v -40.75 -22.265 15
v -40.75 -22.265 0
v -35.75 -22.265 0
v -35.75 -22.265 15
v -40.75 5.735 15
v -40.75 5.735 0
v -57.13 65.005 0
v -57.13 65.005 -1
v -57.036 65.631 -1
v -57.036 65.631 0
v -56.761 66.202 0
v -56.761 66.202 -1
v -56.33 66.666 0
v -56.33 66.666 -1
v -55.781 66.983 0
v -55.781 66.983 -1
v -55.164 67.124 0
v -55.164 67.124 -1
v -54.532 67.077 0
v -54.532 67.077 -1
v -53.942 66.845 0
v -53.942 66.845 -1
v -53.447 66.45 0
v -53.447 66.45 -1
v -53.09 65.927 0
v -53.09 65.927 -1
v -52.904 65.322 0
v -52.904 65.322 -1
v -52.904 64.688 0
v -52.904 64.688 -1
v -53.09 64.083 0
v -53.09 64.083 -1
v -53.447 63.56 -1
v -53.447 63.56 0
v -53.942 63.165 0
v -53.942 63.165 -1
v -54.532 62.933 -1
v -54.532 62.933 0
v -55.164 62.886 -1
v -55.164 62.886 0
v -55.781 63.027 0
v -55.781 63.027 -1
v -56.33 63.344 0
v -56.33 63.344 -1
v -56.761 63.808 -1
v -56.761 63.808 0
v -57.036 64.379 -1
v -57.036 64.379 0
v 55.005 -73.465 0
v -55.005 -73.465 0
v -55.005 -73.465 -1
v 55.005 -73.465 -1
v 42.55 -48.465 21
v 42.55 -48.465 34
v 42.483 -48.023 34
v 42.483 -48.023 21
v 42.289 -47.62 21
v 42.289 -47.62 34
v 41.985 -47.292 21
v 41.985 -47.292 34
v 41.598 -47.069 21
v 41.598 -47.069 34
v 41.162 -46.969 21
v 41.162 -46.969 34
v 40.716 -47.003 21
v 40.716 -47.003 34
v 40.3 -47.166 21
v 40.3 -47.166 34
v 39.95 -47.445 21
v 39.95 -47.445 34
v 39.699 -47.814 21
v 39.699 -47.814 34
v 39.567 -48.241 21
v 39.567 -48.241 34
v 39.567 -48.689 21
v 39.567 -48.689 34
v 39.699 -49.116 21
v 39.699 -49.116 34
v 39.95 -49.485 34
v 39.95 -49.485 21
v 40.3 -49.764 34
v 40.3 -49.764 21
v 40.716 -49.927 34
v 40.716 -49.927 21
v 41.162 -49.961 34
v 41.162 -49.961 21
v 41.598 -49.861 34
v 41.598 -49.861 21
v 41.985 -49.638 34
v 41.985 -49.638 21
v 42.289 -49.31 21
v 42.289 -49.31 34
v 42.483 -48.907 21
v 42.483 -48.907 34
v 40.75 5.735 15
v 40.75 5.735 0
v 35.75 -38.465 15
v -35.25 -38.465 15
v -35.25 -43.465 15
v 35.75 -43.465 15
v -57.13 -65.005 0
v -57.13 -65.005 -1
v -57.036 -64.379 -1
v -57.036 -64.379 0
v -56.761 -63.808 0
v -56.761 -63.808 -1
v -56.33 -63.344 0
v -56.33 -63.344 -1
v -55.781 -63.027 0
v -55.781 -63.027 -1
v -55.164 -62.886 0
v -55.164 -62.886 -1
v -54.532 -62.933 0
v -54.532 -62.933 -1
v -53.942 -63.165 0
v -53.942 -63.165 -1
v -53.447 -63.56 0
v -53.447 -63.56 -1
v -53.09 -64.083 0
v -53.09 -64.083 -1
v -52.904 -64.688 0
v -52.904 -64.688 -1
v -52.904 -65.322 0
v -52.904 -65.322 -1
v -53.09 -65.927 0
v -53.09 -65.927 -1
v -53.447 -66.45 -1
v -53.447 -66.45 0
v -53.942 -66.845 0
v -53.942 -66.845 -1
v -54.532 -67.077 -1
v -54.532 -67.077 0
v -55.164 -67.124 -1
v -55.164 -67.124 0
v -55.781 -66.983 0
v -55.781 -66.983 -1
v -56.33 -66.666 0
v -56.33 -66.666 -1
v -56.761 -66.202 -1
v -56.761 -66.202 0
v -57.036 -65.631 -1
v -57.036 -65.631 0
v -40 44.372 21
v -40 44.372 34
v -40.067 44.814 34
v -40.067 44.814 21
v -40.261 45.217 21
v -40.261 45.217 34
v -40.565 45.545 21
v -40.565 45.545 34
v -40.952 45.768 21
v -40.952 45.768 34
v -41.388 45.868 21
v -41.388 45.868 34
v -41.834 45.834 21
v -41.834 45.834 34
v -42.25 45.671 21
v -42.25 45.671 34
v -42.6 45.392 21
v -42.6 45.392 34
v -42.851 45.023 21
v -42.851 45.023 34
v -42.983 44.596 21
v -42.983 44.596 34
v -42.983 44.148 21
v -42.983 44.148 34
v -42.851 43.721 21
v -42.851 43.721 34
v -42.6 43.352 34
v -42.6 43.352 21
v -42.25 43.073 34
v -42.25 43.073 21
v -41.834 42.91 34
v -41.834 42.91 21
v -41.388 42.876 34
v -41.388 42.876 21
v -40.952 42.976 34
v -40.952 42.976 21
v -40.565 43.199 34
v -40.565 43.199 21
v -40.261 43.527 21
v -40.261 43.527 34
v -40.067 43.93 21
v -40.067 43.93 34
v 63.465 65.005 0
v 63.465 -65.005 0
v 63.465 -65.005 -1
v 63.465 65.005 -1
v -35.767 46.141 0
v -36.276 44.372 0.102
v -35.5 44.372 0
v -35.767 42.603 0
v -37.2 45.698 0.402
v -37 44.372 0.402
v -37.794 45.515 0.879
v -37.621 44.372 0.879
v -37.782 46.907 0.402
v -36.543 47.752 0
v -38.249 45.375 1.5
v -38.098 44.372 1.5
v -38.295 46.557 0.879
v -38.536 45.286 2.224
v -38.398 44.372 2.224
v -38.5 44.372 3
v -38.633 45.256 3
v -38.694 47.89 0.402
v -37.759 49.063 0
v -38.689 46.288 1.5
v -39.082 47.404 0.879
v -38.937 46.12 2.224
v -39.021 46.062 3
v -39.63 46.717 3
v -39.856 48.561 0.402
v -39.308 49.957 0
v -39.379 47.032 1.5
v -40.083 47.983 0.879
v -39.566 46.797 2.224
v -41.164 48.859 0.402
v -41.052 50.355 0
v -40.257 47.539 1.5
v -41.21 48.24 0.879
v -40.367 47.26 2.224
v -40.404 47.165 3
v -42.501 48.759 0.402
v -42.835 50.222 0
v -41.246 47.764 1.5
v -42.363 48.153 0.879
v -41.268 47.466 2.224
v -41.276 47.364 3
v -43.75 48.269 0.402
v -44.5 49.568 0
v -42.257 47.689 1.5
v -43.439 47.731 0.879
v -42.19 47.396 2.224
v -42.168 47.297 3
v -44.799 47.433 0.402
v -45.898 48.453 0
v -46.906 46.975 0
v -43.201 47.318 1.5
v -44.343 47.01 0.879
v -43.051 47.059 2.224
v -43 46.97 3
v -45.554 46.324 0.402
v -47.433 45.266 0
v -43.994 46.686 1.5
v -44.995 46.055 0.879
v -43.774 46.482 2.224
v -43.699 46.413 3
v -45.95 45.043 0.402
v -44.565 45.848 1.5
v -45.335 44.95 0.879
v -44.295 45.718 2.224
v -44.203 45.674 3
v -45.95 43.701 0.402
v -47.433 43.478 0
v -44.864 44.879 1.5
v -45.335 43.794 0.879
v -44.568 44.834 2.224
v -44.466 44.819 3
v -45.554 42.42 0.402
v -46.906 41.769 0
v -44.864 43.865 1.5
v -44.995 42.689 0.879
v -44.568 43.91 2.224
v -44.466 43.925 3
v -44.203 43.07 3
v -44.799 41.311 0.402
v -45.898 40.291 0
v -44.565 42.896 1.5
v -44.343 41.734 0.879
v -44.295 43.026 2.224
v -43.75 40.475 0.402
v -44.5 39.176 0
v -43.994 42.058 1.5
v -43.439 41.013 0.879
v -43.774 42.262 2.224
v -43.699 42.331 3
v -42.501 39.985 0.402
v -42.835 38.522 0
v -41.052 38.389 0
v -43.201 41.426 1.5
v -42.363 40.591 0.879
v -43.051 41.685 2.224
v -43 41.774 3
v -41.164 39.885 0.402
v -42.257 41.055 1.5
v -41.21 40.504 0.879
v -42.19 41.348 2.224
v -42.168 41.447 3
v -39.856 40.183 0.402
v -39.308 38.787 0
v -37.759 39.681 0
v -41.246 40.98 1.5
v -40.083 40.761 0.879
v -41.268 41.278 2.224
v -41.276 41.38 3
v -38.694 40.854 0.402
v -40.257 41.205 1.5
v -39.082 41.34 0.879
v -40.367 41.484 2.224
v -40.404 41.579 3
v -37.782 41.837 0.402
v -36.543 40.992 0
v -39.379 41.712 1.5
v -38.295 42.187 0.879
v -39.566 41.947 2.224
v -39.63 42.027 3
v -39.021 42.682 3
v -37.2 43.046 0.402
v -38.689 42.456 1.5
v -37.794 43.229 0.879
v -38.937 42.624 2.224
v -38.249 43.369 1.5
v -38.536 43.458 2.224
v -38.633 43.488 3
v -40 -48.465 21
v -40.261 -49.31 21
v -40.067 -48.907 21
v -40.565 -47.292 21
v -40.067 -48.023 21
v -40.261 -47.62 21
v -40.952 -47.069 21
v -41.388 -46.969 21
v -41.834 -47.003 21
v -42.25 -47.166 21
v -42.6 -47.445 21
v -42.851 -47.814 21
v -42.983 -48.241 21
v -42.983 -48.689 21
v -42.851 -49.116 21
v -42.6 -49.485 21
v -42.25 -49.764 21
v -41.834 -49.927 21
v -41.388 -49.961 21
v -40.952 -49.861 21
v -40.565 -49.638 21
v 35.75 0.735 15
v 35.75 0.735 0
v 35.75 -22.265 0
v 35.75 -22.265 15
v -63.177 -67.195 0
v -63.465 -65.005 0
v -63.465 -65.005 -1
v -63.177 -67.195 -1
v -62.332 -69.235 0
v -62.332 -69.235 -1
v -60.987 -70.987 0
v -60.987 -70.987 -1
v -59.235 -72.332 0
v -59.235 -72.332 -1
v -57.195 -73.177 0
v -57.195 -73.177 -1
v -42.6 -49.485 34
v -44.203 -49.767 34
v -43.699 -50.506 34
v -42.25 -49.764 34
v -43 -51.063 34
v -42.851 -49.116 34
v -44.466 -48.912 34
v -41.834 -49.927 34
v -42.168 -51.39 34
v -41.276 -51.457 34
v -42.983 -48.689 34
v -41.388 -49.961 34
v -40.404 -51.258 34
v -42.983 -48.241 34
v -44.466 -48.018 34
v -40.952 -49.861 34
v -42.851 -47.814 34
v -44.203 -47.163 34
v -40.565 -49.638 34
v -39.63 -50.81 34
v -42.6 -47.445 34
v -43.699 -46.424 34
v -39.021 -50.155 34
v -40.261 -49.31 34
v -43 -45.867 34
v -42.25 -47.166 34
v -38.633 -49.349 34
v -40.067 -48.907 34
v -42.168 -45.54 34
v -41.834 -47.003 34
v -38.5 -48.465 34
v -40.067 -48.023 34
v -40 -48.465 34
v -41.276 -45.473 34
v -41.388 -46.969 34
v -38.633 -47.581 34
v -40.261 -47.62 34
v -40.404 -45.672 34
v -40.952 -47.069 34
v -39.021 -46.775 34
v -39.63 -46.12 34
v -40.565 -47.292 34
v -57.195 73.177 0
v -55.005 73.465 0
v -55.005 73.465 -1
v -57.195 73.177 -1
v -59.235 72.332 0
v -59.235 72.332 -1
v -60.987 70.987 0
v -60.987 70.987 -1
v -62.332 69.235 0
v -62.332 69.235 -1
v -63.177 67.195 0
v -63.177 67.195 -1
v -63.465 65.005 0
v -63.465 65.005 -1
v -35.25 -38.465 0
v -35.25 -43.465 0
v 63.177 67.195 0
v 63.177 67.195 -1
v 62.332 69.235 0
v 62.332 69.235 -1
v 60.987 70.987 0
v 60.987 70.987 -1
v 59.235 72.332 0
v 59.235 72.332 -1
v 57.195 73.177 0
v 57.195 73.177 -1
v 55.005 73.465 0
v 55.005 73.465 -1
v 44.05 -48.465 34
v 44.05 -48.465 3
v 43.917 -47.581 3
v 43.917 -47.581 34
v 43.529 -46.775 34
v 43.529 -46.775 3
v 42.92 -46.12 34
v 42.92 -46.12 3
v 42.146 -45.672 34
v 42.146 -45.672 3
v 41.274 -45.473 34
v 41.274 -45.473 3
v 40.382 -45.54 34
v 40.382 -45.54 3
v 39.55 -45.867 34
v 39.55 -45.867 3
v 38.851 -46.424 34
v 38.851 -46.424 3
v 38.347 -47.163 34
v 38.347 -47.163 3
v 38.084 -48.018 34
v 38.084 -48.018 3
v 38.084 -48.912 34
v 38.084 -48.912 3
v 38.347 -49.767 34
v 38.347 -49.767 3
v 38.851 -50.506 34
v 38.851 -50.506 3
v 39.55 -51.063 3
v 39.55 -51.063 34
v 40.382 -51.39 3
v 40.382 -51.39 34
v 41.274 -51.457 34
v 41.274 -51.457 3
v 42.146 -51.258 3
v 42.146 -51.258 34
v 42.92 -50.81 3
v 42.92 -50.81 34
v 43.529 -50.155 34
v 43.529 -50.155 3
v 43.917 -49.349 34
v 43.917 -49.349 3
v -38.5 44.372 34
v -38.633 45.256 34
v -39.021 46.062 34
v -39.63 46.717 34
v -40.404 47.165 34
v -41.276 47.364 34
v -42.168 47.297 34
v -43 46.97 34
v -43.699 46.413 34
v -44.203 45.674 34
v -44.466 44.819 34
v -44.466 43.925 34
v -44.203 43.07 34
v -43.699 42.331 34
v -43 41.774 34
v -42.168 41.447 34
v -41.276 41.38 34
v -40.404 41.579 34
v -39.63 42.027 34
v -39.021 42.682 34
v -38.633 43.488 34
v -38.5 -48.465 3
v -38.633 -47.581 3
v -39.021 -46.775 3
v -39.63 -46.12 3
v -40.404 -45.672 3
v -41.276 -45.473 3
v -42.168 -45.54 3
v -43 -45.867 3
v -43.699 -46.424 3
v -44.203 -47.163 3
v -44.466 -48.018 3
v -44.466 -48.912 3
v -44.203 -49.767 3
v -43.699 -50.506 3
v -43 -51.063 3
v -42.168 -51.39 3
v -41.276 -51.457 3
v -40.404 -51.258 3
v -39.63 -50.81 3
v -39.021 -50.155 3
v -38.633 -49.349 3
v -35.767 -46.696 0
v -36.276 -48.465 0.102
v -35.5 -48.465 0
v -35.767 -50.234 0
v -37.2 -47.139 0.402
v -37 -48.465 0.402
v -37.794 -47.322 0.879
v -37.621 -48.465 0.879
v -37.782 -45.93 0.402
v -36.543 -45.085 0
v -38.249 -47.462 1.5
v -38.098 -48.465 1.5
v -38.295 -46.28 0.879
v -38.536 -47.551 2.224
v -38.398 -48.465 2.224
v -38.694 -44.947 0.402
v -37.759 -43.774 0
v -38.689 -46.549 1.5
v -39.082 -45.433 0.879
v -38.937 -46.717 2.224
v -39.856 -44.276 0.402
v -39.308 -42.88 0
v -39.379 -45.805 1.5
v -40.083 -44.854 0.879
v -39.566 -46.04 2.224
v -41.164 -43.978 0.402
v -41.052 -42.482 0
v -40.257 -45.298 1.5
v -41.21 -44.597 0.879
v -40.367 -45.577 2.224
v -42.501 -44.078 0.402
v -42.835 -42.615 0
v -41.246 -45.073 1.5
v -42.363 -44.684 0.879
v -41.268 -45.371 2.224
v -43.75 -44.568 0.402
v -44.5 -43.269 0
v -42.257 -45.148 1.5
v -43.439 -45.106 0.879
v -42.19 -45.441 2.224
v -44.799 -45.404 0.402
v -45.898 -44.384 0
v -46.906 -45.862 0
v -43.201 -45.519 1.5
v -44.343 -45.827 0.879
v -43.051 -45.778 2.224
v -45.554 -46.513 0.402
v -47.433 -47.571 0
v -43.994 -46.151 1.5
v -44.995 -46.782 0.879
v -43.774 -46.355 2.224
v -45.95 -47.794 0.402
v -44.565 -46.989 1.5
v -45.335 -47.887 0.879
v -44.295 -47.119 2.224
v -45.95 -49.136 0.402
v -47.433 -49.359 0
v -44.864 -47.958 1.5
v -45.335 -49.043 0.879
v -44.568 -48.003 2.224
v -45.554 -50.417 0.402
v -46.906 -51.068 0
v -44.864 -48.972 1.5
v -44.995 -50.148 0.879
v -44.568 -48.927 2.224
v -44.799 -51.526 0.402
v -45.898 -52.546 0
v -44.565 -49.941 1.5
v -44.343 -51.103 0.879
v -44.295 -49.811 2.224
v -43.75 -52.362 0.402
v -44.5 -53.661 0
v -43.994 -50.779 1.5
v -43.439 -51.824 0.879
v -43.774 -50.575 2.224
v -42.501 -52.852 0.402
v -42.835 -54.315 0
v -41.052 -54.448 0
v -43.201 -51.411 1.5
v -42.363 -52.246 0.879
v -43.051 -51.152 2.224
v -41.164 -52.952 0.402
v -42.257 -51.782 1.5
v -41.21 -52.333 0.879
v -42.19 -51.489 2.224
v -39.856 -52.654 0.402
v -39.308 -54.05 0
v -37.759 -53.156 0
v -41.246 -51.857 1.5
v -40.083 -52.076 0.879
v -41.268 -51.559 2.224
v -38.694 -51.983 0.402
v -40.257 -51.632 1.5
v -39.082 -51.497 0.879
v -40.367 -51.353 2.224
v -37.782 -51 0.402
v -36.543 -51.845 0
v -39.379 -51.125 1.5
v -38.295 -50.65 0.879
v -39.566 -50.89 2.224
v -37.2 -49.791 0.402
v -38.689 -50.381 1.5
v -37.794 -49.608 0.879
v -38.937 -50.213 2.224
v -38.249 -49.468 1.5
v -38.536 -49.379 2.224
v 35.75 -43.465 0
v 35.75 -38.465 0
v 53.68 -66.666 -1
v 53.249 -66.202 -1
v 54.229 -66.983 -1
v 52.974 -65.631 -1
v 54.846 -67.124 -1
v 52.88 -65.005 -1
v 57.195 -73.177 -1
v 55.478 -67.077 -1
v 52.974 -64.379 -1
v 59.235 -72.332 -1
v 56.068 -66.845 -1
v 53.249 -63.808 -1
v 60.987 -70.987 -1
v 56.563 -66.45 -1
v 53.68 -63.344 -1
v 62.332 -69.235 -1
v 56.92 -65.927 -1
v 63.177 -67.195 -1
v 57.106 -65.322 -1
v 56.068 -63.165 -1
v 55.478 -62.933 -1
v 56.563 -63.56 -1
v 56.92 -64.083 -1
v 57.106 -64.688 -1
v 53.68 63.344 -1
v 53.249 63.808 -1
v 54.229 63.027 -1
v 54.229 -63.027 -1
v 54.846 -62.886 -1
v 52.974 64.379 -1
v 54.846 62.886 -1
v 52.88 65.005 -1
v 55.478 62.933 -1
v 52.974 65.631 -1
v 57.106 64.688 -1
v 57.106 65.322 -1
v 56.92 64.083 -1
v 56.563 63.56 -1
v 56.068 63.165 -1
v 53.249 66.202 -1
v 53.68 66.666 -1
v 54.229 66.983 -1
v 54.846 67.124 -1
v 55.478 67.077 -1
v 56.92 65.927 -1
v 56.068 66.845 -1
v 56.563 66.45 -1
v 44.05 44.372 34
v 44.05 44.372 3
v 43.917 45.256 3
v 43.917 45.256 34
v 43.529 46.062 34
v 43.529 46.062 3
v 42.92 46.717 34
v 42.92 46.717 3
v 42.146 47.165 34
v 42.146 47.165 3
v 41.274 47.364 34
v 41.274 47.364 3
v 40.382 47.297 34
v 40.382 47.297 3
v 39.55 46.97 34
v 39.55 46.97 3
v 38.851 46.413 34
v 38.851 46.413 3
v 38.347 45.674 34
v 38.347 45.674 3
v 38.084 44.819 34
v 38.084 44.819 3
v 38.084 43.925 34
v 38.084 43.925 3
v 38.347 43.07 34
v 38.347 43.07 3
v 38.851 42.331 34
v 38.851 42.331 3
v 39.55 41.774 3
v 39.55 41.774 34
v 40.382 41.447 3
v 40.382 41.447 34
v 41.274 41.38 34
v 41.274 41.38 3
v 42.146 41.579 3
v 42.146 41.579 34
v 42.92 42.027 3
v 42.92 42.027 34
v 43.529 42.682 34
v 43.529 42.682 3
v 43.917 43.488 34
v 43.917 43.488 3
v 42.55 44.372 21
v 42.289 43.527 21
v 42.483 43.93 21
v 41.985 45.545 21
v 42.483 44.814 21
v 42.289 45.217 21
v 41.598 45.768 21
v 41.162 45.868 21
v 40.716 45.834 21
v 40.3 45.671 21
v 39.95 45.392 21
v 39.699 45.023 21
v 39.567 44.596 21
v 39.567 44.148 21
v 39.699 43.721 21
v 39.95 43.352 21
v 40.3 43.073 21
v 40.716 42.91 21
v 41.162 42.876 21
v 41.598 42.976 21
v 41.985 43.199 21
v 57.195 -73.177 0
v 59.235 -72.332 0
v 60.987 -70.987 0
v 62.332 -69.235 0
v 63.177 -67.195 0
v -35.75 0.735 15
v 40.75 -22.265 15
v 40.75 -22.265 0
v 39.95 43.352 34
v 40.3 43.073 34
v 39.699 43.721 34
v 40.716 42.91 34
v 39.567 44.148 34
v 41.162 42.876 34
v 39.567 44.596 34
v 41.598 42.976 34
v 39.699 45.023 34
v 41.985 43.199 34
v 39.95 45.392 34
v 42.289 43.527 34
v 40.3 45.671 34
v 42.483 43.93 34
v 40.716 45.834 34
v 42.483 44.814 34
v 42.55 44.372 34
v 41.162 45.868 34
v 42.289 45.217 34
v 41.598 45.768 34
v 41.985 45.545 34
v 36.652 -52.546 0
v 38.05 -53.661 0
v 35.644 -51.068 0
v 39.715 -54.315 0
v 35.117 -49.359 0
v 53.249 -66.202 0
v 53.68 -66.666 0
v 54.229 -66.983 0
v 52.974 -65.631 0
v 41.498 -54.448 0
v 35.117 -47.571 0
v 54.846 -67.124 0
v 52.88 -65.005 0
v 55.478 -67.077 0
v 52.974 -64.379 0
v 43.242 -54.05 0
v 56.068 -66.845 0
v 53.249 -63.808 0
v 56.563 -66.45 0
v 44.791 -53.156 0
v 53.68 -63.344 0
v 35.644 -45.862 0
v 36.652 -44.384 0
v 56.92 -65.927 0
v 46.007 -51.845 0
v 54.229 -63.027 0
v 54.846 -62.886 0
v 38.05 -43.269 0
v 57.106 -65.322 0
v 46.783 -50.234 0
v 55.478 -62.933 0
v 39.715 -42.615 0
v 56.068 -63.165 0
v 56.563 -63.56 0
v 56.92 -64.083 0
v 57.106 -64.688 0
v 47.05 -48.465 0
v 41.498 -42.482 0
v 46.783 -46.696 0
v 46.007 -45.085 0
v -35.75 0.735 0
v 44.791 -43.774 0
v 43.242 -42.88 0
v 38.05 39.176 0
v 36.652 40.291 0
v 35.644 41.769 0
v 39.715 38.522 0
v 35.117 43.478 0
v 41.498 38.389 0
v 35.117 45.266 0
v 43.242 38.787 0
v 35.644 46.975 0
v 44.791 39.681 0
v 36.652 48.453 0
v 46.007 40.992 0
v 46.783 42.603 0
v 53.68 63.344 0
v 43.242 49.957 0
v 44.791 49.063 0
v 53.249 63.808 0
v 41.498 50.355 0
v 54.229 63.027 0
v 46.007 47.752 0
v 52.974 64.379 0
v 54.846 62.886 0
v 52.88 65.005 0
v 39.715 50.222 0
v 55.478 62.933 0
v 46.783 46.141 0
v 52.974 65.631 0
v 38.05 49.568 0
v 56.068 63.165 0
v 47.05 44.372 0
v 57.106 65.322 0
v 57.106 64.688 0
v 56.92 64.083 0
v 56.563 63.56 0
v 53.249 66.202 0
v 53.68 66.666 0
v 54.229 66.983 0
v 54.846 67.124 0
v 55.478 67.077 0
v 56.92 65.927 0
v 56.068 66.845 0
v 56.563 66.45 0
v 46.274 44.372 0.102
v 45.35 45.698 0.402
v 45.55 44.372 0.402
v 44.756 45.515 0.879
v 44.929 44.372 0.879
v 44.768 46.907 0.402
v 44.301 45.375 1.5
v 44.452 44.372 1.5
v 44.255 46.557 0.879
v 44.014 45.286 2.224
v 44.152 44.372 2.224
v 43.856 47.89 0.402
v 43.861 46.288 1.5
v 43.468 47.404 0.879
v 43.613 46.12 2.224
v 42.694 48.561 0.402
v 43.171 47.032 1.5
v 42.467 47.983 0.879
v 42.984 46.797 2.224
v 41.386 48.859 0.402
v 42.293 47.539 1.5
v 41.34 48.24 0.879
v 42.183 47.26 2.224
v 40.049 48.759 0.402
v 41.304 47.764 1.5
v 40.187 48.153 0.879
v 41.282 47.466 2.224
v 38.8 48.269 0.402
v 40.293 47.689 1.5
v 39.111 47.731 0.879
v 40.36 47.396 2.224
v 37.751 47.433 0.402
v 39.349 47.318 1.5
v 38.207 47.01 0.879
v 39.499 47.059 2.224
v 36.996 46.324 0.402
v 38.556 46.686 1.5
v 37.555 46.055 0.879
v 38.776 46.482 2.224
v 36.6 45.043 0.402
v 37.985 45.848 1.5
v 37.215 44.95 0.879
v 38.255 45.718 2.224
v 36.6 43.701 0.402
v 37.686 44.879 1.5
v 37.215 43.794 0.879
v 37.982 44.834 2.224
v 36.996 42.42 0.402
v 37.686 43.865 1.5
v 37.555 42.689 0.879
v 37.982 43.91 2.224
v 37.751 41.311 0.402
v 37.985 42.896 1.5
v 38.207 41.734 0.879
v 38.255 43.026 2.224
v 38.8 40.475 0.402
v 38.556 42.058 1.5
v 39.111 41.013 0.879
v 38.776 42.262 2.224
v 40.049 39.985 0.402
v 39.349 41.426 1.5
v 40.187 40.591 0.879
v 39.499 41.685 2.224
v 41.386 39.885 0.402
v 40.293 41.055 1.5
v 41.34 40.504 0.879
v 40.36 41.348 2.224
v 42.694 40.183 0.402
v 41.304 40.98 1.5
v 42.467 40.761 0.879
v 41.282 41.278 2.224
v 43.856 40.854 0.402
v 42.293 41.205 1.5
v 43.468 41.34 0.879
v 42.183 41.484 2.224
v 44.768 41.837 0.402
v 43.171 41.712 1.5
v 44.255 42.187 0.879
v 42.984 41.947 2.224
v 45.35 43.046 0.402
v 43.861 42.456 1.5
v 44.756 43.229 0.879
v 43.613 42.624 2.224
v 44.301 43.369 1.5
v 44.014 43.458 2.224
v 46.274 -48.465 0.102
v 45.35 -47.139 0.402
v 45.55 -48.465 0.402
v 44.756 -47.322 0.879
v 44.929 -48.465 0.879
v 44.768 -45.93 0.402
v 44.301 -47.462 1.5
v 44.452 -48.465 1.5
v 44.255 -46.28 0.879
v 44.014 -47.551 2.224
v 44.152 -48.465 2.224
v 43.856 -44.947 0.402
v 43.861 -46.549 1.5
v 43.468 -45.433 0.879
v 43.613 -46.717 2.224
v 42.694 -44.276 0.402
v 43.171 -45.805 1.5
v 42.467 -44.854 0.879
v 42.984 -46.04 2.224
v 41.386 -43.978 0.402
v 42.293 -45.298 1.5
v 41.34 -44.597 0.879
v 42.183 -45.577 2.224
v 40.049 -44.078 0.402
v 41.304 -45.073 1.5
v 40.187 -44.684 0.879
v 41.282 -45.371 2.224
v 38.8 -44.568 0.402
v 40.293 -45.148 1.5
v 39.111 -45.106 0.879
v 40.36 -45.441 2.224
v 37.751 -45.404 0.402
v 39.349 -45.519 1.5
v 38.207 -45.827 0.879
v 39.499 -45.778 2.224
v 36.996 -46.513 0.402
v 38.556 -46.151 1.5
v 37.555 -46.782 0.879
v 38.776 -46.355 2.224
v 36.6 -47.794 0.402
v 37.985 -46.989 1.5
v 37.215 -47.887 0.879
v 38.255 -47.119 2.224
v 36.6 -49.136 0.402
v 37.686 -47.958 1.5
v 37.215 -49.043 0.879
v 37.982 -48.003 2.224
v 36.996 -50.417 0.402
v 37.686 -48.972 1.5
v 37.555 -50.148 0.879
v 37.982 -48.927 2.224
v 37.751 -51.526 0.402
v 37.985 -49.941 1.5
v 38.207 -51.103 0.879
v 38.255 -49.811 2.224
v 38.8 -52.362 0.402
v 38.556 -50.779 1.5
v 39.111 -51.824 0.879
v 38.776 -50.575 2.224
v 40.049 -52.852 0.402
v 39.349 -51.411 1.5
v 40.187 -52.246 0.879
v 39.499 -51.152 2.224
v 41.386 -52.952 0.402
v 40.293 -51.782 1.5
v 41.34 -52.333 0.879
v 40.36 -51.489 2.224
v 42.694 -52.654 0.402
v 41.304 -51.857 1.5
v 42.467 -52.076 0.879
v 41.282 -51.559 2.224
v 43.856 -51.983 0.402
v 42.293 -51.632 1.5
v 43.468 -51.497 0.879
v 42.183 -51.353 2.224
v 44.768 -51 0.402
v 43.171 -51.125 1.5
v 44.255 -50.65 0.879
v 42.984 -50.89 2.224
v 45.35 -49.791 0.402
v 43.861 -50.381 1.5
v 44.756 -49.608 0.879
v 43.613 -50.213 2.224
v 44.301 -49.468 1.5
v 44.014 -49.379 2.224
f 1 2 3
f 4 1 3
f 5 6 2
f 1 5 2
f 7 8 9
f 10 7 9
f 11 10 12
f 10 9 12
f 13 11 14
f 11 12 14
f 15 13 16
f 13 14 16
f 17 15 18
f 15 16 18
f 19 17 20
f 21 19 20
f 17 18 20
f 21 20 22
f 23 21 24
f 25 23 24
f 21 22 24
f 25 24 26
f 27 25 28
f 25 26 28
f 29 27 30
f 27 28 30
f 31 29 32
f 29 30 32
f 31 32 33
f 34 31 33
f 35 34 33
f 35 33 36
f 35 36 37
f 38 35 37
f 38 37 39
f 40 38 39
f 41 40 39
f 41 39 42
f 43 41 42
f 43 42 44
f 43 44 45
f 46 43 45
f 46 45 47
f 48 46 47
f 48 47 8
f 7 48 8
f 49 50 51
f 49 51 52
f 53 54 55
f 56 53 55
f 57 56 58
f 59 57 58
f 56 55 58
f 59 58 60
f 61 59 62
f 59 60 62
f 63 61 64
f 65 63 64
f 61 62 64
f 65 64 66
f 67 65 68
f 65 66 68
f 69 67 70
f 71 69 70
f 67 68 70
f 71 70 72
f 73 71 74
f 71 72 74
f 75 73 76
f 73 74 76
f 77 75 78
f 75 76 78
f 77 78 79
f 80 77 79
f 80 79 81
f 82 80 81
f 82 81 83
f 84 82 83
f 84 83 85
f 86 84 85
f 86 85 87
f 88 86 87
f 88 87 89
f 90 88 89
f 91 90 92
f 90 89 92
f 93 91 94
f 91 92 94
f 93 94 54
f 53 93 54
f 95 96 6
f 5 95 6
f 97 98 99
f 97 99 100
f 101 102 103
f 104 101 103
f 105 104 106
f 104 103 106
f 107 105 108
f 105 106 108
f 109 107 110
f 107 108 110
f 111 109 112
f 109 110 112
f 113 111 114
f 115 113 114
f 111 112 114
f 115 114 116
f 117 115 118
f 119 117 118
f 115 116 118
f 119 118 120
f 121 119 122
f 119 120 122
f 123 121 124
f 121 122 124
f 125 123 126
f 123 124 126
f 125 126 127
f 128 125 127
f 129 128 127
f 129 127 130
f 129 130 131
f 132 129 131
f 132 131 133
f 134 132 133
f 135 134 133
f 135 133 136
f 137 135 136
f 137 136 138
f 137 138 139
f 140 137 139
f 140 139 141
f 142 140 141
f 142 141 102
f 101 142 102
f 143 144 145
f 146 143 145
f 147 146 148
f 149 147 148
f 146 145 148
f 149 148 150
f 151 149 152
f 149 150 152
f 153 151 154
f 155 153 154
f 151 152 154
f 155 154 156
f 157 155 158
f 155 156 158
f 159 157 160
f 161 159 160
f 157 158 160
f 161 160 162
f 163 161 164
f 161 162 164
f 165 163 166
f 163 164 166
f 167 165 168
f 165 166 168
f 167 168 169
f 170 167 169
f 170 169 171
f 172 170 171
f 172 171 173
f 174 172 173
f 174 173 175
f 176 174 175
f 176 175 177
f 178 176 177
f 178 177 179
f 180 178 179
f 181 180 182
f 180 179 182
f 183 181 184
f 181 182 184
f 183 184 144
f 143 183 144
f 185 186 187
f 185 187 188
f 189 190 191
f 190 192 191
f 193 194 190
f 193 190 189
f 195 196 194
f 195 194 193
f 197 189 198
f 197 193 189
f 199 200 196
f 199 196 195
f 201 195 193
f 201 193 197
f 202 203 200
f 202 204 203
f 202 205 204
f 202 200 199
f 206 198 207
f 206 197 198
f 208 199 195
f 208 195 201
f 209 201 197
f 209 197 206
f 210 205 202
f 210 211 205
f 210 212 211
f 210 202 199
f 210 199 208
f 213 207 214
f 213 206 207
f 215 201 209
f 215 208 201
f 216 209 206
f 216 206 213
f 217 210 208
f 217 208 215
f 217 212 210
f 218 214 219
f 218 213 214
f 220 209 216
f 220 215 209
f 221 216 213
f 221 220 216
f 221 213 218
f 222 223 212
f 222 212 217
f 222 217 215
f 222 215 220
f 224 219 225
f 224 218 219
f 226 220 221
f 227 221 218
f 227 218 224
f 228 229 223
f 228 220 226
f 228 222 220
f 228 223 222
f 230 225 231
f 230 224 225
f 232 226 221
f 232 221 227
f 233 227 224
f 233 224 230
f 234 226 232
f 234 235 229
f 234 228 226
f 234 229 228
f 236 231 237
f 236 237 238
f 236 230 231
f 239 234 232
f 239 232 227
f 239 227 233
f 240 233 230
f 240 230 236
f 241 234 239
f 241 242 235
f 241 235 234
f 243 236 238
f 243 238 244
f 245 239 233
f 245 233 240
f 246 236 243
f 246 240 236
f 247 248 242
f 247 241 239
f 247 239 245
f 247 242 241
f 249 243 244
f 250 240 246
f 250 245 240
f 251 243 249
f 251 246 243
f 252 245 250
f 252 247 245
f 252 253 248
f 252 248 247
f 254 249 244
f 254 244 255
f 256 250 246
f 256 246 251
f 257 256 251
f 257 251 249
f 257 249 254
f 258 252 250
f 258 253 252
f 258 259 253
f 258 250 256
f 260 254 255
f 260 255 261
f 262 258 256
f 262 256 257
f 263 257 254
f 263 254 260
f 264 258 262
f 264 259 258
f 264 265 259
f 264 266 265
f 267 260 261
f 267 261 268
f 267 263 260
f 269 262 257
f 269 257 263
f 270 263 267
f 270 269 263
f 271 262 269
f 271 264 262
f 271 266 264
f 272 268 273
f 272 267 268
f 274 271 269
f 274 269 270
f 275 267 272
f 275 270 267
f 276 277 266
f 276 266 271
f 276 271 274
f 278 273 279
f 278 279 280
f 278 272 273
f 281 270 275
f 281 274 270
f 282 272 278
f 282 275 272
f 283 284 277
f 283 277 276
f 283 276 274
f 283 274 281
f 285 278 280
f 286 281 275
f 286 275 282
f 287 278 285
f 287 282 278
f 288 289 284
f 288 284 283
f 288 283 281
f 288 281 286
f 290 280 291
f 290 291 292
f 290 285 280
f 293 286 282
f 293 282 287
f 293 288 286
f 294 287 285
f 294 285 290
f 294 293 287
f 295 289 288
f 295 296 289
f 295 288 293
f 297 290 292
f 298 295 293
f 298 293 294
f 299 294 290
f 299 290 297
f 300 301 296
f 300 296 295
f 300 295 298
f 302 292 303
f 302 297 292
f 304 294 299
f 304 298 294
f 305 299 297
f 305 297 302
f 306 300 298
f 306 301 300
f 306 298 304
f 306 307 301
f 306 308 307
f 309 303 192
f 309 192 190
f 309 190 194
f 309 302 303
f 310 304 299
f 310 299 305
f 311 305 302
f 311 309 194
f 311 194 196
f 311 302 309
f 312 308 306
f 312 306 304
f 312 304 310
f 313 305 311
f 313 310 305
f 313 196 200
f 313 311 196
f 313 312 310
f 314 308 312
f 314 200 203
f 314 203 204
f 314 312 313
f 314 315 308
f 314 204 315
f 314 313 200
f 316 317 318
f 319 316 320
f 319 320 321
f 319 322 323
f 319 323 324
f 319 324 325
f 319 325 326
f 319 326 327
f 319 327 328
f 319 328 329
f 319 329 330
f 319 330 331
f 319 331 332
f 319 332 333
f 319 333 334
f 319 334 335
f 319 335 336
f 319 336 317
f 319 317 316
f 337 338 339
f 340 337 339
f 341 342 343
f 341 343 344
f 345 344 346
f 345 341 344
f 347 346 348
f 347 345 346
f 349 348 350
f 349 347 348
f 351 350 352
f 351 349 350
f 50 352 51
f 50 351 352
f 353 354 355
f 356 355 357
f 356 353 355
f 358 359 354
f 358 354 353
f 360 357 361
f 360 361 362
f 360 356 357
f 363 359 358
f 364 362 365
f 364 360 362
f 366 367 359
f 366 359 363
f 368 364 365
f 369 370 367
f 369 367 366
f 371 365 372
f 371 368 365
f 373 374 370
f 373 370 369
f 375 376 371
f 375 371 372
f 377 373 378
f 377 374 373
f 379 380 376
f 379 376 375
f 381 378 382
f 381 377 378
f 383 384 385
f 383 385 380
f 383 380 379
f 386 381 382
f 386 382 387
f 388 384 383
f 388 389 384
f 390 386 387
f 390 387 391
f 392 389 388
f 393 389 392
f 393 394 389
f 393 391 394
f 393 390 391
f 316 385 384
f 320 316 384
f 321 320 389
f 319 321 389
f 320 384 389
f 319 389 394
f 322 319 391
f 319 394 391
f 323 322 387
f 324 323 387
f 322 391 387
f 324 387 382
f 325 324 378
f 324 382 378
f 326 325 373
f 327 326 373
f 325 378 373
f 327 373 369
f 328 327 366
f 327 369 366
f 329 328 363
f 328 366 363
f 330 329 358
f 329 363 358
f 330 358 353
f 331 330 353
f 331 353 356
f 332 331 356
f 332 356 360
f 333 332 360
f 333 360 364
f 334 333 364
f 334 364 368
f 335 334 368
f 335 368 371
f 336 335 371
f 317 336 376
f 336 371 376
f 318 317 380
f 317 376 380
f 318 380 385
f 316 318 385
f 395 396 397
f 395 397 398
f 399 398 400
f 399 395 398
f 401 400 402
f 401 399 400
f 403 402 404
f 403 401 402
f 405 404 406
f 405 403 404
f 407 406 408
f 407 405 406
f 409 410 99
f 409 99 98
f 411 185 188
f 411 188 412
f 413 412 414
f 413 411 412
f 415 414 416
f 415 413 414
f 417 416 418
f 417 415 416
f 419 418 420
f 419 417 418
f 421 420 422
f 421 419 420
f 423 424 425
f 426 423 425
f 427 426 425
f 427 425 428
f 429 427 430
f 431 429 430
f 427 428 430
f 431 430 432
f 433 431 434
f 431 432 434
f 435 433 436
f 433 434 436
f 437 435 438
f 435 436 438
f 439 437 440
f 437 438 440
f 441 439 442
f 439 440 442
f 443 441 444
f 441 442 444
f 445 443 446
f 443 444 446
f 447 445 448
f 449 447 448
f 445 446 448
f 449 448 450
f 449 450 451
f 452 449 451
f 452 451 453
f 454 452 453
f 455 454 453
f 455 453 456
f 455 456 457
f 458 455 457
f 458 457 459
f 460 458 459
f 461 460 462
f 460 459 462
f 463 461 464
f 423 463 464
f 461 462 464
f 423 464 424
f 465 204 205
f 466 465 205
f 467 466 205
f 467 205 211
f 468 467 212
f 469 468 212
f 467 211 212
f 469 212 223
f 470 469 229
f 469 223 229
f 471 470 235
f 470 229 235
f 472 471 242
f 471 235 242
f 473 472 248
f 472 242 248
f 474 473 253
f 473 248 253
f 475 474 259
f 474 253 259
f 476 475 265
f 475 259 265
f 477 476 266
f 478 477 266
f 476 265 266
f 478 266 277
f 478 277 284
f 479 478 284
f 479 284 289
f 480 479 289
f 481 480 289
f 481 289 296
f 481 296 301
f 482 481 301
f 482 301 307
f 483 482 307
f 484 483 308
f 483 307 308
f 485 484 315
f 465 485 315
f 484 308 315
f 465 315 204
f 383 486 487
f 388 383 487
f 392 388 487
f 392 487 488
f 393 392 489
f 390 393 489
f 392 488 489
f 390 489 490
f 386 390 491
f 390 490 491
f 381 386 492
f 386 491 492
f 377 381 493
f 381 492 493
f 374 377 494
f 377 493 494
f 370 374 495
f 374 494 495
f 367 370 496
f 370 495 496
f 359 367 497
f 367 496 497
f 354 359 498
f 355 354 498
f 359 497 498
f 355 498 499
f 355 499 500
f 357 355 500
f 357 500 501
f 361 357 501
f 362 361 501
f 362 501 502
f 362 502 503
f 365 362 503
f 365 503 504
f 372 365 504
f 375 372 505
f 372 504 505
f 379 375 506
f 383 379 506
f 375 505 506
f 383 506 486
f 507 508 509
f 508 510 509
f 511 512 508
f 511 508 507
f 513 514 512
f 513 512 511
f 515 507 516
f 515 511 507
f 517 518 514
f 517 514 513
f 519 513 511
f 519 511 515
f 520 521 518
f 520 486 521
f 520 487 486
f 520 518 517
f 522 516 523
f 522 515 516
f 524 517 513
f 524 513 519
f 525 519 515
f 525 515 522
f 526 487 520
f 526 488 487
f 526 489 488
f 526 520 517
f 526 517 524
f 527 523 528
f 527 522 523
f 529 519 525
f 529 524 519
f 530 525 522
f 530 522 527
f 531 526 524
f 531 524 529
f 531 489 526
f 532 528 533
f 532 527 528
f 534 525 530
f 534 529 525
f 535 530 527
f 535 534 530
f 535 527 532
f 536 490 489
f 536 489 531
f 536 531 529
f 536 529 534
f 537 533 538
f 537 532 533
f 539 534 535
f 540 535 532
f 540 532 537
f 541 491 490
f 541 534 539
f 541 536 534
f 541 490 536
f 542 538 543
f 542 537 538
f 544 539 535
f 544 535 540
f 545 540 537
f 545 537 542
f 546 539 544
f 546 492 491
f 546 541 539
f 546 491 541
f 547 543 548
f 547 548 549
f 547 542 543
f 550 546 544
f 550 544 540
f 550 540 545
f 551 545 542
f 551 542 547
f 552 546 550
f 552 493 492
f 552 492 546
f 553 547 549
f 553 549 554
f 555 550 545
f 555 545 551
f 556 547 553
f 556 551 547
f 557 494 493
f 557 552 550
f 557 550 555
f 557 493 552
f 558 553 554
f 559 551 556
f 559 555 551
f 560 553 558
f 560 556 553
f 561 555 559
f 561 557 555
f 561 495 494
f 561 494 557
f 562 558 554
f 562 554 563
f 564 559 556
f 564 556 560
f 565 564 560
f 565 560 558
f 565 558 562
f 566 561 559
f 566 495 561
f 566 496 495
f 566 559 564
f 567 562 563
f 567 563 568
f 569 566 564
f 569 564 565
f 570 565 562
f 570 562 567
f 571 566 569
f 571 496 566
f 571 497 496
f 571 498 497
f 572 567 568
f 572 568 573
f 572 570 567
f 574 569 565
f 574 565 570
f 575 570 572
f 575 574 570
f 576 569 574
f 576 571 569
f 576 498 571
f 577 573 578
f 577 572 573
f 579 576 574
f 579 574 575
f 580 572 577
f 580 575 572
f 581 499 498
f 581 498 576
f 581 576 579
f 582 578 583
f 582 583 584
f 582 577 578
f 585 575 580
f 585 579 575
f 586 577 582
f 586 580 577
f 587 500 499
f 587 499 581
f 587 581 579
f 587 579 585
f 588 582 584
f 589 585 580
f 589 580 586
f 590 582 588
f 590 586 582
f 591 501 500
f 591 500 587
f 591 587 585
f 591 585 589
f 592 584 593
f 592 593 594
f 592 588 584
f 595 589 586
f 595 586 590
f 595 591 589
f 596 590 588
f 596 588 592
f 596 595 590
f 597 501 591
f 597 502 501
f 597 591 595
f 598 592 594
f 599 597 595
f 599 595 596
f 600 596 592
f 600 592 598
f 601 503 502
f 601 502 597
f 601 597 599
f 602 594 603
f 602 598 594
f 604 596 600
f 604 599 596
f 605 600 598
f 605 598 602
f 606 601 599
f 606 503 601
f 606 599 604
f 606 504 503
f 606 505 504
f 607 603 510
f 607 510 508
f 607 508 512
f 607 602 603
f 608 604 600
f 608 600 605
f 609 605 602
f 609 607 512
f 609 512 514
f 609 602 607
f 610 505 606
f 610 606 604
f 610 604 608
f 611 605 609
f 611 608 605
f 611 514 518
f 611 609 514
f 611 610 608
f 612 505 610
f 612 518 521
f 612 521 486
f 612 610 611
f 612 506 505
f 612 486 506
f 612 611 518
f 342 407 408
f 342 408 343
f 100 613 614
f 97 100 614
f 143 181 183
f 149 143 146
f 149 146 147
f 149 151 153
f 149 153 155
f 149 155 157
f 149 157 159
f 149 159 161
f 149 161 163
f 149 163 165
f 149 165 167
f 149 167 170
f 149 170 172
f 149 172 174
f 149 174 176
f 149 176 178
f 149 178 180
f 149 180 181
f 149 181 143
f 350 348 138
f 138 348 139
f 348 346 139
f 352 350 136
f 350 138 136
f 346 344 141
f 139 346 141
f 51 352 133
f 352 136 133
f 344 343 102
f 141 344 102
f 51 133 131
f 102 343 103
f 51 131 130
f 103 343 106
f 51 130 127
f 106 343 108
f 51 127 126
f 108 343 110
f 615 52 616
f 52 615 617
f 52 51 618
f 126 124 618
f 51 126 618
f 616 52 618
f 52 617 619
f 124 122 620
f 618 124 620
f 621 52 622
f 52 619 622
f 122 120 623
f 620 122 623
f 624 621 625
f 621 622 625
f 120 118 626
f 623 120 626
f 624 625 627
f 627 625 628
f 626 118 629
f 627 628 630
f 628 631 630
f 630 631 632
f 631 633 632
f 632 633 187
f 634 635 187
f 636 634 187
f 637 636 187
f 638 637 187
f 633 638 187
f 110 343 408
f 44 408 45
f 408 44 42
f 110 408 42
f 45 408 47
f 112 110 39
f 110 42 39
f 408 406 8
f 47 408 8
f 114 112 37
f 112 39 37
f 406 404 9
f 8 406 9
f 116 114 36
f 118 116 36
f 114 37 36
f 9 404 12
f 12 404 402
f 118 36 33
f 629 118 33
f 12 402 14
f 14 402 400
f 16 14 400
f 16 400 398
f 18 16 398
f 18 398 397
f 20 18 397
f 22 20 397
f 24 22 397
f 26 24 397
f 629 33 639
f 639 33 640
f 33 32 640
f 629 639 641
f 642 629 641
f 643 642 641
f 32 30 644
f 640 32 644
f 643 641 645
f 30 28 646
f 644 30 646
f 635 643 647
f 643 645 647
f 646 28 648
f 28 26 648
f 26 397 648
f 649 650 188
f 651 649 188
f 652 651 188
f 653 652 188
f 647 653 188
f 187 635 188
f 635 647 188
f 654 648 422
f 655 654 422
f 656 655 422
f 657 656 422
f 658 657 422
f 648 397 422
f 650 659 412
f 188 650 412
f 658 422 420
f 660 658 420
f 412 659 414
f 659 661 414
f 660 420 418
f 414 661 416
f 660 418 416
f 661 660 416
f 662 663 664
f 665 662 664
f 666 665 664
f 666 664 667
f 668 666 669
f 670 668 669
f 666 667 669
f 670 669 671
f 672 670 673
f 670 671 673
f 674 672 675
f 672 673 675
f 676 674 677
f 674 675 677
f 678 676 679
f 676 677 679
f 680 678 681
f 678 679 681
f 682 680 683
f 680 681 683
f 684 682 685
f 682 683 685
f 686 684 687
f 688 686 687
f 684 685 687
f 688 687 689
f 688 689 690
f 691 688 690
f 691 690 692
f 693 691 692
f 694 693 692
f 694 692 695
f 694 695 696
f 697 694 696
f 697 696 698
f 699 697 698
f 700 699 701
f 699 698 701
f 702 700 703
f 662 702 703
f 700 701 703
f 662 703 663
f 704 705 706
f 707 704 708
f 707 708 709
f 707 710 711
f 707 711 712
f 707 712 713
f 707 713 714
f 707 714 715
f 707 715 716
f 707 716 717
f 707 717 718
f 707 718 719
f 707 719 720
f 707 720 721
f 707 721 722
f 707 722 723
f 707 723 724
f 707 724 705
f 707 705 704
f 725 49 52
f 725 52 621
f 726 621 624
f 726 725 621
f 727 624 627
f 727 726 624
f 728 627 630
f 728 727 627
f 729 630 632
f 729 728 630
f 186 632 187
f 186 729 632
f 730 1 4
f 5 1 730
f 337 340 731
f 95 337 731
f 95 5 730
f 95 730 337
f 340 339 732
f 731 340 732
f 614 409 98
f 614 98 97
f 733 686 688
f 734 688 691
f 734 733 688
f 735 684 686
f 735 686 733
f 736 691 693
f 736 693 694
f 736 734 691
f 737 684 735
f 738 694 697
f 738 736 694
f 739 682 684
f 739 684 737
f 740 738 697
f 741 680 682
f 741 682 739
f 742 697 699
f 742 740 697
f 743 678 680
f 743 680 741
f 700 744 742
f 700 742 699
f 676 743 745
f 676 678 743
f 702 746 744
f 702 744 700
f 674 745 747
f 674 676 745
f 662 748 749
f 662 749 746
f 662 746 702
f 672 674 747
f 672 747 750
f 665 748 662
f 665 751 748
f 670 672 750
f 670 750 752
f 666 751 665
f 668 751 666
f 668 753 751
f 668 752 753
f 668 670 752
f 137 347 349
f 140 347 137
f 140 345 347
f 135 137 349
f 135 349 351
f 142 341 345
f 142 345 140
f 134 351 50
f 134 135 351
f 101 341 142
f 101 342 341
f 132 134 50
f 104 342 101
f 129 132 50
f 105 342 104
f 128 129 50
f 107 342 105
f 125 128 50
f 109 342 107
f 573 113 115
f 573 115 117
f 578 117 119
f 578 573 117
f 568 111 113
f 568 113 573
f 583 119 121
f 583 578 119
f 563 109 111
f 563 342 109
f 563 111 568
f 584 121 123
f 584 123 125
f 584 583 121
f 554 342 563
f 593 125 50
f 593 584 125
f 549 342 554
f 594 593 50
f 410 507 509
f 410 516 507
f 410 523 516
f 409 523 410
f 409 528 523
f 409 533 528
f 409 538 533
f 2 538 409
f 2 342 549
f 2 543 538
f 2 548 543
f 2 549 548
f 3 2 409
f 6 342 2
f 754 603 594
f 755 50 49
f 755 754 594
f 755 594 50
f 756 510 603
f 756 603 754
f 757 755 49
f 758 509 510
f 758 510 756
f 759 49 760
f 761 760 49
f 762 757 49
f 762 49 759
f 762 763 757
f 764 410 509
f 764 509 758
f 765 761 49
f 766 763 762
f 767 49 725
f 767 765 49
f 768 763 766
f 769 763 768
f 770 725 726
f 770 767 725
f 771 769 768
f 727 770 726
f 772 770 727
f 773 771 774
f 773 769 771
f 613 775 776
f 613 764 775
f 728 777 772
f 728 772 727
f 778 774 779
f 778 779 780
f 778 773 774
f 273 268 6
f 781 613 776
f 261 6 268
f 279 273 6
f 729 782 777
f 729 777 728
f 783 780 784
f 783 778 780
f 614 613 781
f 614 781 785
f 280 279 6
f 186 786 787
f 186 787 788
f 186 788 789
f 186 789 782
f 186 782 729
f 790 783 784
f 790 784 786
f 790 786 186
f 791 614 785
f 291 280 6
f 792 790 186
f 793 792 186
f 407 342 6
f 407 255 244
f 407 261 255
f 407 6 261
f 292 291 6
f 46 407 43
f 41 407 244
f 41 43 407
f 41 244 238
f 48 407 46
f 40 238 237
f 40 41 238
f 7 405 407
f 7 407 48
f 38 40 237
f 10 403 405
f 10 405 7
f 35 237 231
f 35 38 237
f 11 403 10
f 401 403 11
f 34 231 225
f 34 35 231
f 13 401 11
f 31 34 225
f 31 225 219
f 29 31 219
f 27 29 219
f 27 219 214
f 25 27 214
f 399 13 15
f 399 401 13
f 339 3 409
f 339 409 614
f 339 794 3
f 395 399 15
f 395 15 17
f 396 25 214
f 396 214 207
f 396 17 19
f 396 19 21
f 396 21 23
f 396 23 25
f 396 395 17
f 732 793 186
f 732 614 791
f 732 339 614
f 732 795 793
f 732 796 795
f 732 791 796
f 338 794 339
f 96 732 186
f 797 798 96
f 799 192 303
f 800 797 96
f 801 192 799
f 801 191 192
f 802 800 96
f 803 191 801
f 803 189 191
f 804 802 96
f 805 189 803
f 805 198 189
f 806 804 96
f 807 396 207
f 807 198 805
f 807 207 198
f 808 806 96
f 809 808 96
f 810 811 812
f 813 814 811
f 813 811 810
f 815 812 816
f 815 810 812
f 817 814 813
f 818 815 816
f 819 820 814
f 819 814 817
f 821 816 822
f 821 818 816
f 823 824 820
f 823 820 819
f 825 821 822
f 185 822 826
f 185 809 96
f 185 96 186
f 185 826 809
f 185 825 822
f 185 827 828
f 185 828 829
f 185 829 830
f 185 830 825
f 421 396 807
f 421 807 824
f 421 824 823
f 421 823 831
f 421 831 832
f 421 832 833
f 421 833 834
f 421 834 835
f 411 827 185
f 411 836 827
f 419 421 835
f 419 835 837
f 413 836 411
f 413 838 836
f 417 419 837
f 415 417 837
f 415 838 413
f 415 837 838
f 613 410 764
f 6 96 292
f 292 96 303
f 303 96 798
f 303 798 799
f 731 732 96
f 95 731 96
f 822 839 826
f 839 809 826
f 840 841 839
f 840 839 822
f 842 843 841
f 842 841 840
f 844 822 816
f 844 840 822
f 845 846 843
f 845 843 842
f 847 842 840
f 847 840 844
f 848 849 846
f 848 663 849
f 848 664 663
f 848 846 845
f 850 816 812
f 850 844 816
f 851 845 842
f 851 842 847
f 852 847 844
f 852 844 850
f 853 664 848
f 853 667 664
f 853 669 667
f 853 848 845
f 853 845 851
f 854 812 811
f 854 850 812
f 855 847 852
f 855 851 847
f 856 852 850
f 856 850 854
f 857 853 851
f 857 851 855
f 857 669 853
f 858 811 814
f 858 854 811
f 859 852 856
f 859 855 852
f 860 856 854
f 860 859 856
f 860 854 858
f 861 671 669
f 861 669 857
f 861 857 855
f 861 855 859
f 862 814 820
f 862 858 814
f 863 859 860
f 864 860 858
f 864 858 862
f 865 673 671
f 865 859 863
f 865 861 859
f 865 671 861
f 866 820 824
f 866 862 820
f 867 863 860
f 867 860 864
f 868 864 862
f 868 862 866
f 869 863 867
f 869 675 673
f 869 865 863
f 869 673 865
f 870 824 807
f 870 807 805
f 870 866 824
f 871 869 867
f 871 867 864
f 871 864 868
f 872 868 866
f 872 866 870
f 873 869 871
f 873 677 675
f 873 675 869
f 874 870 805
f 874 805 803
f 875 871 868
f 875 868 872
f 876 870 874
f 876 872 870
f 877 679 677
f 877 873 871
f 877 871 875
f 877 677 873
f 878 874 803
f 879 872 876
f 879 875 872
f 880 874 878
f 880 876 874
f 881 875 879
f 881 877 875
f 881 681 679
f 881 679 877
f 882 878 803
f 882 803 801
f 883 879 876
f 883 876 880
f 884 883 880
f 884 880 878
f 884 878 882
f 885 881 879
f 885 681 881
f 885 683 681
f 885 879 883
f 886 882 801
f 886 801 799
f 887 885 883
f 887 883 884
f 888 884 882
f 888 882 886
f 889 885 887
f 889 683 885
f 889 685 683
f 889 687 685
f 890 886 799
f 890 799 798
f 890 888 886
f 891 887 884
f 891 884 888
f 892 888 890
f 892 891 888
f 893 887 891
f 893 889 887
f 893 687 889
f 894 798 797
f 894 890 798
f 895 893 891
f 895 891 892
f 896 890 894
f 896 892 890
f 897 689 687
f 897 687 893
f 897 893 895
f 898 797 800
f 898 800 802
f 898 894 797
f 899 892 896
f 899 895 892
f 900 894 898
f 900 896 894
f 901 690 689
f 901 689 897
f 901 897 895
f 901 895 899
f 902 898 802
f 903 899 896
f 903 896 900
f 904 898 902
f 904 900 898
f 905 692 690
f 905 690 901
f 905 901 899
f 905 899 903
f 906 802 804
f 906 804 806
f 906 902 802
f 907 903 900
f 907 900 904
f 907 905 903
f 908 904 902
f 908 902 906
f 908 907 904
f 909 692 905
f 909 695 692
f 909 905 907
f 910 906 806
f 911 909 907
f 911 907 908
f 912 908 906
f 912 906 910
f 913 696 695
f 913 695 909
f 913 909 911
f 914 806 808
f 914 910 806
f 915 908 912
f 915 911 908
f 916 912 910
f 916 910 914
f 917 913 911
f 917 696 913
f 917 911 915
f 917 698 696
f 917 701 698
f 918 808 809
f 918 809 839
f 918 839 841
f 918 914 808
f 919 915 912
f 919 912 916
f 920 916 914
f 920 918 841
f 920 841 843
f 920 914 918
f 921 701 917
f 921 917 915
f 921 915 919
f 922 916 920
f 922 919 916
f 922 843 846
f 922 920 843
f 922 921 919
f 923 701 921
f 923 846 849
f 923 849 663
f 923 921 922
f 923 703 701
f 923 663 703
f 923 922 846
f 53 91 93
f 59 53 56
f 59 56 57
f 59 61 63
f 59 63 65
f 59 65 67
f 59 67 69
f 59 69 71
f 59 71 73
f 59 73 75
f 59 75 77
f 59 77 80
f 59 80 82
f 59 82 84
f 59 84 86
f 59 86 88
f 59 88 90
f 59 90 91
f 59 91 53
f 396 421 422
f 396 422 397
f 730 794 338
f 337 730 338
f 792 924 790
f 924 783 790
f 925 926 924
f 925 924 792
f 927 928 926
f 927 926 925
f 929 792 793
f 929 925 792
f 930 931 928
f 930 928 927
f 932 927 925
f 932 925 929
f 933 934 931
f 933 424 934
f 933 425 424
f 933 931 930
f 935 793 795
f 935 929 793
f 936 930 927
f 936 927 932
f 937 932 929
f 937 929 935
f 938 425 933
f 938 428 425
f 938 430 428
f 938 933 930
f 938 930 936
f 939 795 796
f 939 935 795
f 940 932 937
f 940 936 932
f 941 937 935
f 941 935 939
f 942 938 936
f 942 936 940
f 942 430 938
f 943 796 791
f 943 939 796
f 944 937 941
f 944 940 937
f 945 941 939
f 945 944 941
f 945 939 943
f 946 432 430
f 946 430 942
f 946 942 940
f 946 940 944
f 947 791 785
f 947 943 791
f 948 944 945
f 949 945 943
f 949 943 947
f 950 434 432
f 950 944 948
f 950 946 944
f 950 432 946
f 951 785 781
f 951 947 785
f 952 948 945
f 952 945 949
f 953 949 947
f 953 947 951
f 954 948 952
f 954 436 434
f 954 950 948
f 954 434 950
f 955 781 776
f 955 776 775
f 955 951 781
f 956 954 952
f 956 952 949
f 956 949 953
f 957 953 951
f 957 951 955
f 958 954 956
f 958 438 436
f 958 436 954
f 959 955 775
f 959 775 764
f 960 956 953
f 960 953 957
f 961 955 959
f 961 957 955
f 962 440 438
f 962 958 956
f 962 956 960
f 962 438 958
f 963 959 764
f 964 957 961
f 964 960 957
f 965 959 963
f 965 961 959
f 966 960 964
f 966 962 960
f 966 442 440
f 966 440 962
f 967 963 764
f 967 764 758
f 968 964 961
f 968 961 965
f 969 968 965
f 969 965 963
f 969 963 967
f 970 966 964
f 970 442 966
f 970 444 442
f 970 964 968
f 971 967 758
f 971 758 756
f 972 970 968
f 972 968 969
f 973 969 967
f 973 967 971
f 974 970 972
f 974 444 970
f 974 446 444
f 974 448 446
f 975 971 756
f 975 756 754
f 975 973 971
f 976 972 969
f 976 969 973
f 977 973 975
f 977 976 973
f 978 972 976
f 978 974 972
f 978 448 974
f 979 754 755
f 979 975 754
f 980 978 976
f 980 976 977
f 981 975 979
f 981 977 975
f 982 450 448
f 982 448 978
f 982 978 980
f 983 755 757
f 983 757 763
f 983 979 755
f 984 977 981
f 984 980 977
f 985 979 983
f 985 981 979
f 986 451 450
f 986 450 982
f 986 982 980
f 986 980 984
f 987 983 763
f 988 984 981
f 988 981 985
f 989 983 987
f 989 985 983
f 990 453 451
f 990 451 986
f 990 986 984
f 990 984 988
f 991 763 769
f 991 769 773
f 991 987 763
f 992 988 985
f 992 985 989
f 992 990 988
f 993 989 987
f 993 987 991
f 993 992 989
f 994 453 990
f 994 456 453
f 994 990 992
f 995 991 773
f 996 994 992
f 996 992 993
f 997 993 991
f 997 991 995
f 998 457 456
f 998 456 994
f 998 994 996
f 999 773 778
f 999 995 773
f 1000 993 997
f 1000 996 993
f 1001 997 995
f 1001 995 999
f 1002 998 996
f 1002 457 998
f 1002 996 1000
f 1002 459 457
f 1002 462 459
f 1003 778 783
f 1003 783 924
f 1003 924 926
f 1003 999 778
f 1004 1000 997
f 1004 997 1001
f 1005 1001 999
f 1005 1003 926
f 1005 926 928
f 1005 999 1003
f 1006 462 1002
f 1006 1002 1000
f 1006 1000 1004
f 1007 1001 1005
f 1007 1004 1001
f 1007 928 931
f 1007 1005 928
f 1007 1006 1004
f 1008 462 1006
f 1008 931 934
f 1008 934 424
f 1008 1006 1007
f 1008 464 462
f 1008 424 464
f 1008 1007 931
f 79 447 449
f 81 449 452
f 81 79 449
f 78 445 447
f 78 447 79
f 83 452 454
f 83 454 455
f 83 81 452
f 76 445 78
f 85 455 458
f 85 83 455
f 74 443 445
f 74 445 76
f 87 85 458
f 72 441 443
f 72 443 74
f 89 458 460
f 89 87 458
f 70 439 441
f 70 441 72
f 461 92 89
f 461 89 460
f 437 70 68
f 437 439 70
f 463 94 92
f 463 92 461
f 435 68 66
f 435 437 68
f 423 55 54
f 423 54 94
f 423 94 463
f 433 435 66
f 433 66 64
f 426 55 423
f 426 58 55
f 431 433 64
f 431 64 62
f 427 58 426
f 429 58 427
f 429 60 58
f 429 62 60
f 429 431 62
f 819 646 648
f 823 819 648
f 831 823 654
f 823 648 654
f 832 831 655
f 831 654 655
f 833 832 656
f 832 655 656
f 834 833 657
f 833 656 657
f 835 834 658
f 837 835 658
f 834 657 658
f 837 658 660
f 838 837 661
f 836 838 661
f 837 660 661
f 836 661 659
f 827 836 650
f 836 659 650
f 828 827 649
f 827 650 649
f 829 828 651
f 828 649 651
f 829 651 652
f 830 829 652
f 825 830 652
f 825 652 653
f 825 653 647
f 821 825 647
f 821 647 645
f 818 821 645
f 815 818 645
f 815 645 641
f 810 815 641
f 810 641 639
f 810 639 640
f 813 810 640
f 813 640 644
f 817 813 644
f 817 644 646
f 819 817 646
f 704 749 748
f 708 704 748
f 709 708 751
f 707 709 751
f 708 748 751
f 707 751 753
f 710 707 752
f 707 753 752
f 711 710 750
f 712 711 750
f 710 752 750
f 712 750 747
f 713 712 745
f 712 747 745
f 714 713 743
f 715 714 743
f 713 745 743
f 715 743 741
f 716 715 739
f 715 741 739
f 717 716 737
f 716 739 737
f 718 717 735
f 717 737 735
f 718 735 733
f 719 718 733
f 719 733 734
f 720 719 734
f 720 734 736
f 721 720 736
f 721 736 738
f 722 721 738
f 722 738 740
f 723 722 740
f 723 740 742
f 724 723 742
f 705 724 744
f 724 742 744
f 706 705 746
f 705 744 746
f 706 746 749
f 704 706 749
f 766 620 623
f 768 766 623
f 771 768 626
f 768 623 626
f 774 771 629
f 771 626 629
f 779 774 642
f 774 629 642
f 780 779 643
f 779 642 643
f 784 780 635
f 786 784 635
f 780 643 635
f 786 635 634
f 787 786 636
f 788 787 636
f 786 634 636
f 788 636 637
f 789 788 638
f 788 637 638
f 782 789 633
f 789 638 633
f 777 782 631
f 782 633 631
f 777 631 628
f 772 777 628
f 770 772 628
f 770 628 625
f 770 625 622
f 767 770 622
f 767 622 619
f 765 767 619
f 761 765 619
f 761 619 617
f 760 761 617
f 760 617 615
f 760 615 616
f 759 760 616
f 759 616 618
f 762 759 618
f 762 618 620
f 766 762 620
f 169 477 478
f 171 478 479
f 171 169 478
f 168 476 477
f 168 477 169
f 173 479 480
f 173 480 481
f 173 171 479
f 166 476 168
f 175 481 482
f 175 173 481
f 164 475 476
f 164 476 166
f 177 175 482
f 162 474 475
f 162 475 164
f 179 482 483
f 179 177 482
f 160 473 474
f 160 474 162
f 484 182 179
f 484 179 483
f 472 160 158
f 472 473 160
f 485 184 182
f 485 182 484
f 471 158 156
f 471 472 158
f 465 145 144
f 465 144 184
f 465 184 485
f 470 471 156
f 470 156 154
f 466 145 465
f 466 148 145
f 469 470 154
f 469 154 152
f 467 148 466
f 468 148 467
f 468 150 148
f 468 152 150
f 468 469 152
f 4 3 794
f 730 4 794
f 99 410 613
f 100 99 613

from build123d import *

# Parameters (mm, degrees)
BASE_FLANGE1_DEPTH      = 1
SKETCH7_R               = 2.125
CUT_EXTRUDE1_DEPTH      = 10
SKETCH8_R               = 3
BOSS_EXTRUDE3_DEPTH     = 34
EXTRUDE_THIN1_OUTLINE_W = 71
EXTRUDE_THIN1_OUTLINE_H = 5
EXTRUDE_THIN1_DEPTH     = 15
SKETCH17_R              = 1.5
CUT_EXTRUDE3_DEPTH      = 13
SKETCH15_R              = 1.5
CUT_EXTRUDE4_DEPTH      = 13
SKETCH13_R              = 1.5
CUT_EXTRUDE5_DEPTH      = 13
SKETCH14_R              = 1.5
CUT_EXTRUDE6_DEPTH      = 13
FILLET1_R               = 3
FILLET2_R               = 3
FILLET3_R               = 3
FILLET4_R               = 3


# Read off the part's stored shape, not the designer's step: Extrude-Thin1
# Sheet-metal steps are written as plain solids
with BuildPart() as part:
    # Sketch1 → Base-Flange1 (new body)
    with BuildSketch(Plane.XY):
        with BuildLine():
            Line((-55.005, -73.465), (55.005, -73.465))
            ThreePointArc((55.005, -73.465), (60.987123369, -70.987123369), (63.465, -65.005))
            Line((63.465, -65.005), (63.465, 65.005))
            ThreePointArc((63.465, 65.005), (60.987123369, 70.987123369), (55.005, 73.465))
            Line((55.005, 73.465), (-55.005, 73.465))
            ThreePointArc((-55.005, 73.465), (-60.987123369, 70.987123369), (-63.465, 65.005))
            Line((-63.465, 65.005), (-63.465, -65.005))
            ThreePointArc((-63.465, -65.005), (-60.987123369, -70.987123369), (-55.005, -73.465))
        make_face()
    extrude(amount=-BASE_FLANGE1_DEPTH)

    # Sketch7 → Cut-Extrude1 (cut)
    with BuildSketch(Plane(origin=(0, 0, -1), x_dir=(-1, 0, 0), z_dir=(0, 0, -1))):
        with Locations((55.005, 65.005)):
            Circle(SKETCH7_R)
        with Locations((-55.005, 65.005)):
            Circle(SKETCH7_R)
        with Locations((55.005, -65.005)):
            Circle(SKETCH7_R)
        with Locations((-55.005, -65.005)):
            Circle(SKETCH7_R)
    extrude(amount=-CUT_EXTRUDE1_DEPTH, mode=Mode.SUBTRACT)

    # Sketch8 → Boss-Extrude3 (add)
    with BuildSketch(Plane.XY):
        with Locations((-41.5, -48.465)):
            Circle(SKETCH8_R)
        with Locations((-41.5, 44.372)):
            Circle(SKETCH8_R)
        with Locations((41.05, -48.465)):
            Circle(SKETCH8_R)
        with Locations((41.05, 44.372)):
            Circle(SKETCH8_R)
    extrude(amount=BOSS_EXTRUDE3_DEPTH)

    # Extrude-Thin1 outline → Extrude-Thin1 (add)
    with BuildSketch(Plane.XY):
        with Locations((0.25, -40.965)):
            Rectangle(EXTRUDE_THIN1_OUTLINE_W, EXTRUDE_THIN1_OUTLINE_H)
        Polygon((-40.75, 5.735), (-40.75, -22.265), (-35.75, -22.265), (-35.75, 0.735), (35.75, 0.735), (35.75, -22.265), (40.75, -22.265), (40.75, 5.735), align=None)
    extrude(amount=EXTRUDE_THIN1_DEPTH)

    # Sketch17 → Cut-Extrude3 (cut)
    with BuildSketch(Plane.XY.offset(34)):
        with Locations((41.05, -48.465)):
            Circle(SKETCH17_R)
    extrude(amount=-CUT_EXTRUDE3_DEPTH, mode=Mode.SUBTRACT)

    # Sketch15 → Cut-Extrude4 (cut)
    with BuildSketch(Plane.XY.offset(34)):
        with Locations((-41.5, -48.465)):
            Circle(SKETCH15_R)
    extrude(amount=-CUT_EXTRUDE4_DEPTH, mode=Mode.SUBTRACT)

    # Sketch13 → Cut-Extrude5 (cut)
    with BuildSketch(Plane.XY.offset(34)):
        with Locations((-41.5, 44.372)):
            Circle(SKETCH13_R)
    extrude(amount=-CUT_EXTRUDE5_DEPTH, mode=Mode.SUBTRACT)

    # Sketch14 → Cut-Extrude6 (cut)
    with BuildSketch(Plane.XY.offset(34)):
        with Locations((41.05, 44.372)):
            Circle(SKETCH14_R)
    extrude(amount=-CUT_EXTRUDE6_DEPTH, mode=Mode.SUBTRACT)

    # Fillet1
    fillet1_edges = [part.edges().sort_by_distance(p)[0] for p in [
        (-44.5, -48.465, 0),
    ]]
    fillet(fillet1_edges, radius=FILLET1_R)

    # Fillet2
    fillet2_edges = [part.edges().sort_by_distance(p)[0] for p in [
        (38.05, -48.465, 0),
    ]]
    fillet(fillet2_edges, radius=FILLET2_R)

    # Fillet3
    fillet3_edges = [part.edges().sort_by_distance(p)[0] for p in [
        (-44.5, 44.372, 0),
    ]]
    fillet(fillet3_edges, radius=FILLET3_R)

    # Fillet4
    fillet4_edges = [part.edges().sort_by_distance(p)[0] for p in [
        (38.05, 44.372, 0),
    ]]
    fillet(fillet4_edges, radius=FILLET4_R)


solid = part.part
